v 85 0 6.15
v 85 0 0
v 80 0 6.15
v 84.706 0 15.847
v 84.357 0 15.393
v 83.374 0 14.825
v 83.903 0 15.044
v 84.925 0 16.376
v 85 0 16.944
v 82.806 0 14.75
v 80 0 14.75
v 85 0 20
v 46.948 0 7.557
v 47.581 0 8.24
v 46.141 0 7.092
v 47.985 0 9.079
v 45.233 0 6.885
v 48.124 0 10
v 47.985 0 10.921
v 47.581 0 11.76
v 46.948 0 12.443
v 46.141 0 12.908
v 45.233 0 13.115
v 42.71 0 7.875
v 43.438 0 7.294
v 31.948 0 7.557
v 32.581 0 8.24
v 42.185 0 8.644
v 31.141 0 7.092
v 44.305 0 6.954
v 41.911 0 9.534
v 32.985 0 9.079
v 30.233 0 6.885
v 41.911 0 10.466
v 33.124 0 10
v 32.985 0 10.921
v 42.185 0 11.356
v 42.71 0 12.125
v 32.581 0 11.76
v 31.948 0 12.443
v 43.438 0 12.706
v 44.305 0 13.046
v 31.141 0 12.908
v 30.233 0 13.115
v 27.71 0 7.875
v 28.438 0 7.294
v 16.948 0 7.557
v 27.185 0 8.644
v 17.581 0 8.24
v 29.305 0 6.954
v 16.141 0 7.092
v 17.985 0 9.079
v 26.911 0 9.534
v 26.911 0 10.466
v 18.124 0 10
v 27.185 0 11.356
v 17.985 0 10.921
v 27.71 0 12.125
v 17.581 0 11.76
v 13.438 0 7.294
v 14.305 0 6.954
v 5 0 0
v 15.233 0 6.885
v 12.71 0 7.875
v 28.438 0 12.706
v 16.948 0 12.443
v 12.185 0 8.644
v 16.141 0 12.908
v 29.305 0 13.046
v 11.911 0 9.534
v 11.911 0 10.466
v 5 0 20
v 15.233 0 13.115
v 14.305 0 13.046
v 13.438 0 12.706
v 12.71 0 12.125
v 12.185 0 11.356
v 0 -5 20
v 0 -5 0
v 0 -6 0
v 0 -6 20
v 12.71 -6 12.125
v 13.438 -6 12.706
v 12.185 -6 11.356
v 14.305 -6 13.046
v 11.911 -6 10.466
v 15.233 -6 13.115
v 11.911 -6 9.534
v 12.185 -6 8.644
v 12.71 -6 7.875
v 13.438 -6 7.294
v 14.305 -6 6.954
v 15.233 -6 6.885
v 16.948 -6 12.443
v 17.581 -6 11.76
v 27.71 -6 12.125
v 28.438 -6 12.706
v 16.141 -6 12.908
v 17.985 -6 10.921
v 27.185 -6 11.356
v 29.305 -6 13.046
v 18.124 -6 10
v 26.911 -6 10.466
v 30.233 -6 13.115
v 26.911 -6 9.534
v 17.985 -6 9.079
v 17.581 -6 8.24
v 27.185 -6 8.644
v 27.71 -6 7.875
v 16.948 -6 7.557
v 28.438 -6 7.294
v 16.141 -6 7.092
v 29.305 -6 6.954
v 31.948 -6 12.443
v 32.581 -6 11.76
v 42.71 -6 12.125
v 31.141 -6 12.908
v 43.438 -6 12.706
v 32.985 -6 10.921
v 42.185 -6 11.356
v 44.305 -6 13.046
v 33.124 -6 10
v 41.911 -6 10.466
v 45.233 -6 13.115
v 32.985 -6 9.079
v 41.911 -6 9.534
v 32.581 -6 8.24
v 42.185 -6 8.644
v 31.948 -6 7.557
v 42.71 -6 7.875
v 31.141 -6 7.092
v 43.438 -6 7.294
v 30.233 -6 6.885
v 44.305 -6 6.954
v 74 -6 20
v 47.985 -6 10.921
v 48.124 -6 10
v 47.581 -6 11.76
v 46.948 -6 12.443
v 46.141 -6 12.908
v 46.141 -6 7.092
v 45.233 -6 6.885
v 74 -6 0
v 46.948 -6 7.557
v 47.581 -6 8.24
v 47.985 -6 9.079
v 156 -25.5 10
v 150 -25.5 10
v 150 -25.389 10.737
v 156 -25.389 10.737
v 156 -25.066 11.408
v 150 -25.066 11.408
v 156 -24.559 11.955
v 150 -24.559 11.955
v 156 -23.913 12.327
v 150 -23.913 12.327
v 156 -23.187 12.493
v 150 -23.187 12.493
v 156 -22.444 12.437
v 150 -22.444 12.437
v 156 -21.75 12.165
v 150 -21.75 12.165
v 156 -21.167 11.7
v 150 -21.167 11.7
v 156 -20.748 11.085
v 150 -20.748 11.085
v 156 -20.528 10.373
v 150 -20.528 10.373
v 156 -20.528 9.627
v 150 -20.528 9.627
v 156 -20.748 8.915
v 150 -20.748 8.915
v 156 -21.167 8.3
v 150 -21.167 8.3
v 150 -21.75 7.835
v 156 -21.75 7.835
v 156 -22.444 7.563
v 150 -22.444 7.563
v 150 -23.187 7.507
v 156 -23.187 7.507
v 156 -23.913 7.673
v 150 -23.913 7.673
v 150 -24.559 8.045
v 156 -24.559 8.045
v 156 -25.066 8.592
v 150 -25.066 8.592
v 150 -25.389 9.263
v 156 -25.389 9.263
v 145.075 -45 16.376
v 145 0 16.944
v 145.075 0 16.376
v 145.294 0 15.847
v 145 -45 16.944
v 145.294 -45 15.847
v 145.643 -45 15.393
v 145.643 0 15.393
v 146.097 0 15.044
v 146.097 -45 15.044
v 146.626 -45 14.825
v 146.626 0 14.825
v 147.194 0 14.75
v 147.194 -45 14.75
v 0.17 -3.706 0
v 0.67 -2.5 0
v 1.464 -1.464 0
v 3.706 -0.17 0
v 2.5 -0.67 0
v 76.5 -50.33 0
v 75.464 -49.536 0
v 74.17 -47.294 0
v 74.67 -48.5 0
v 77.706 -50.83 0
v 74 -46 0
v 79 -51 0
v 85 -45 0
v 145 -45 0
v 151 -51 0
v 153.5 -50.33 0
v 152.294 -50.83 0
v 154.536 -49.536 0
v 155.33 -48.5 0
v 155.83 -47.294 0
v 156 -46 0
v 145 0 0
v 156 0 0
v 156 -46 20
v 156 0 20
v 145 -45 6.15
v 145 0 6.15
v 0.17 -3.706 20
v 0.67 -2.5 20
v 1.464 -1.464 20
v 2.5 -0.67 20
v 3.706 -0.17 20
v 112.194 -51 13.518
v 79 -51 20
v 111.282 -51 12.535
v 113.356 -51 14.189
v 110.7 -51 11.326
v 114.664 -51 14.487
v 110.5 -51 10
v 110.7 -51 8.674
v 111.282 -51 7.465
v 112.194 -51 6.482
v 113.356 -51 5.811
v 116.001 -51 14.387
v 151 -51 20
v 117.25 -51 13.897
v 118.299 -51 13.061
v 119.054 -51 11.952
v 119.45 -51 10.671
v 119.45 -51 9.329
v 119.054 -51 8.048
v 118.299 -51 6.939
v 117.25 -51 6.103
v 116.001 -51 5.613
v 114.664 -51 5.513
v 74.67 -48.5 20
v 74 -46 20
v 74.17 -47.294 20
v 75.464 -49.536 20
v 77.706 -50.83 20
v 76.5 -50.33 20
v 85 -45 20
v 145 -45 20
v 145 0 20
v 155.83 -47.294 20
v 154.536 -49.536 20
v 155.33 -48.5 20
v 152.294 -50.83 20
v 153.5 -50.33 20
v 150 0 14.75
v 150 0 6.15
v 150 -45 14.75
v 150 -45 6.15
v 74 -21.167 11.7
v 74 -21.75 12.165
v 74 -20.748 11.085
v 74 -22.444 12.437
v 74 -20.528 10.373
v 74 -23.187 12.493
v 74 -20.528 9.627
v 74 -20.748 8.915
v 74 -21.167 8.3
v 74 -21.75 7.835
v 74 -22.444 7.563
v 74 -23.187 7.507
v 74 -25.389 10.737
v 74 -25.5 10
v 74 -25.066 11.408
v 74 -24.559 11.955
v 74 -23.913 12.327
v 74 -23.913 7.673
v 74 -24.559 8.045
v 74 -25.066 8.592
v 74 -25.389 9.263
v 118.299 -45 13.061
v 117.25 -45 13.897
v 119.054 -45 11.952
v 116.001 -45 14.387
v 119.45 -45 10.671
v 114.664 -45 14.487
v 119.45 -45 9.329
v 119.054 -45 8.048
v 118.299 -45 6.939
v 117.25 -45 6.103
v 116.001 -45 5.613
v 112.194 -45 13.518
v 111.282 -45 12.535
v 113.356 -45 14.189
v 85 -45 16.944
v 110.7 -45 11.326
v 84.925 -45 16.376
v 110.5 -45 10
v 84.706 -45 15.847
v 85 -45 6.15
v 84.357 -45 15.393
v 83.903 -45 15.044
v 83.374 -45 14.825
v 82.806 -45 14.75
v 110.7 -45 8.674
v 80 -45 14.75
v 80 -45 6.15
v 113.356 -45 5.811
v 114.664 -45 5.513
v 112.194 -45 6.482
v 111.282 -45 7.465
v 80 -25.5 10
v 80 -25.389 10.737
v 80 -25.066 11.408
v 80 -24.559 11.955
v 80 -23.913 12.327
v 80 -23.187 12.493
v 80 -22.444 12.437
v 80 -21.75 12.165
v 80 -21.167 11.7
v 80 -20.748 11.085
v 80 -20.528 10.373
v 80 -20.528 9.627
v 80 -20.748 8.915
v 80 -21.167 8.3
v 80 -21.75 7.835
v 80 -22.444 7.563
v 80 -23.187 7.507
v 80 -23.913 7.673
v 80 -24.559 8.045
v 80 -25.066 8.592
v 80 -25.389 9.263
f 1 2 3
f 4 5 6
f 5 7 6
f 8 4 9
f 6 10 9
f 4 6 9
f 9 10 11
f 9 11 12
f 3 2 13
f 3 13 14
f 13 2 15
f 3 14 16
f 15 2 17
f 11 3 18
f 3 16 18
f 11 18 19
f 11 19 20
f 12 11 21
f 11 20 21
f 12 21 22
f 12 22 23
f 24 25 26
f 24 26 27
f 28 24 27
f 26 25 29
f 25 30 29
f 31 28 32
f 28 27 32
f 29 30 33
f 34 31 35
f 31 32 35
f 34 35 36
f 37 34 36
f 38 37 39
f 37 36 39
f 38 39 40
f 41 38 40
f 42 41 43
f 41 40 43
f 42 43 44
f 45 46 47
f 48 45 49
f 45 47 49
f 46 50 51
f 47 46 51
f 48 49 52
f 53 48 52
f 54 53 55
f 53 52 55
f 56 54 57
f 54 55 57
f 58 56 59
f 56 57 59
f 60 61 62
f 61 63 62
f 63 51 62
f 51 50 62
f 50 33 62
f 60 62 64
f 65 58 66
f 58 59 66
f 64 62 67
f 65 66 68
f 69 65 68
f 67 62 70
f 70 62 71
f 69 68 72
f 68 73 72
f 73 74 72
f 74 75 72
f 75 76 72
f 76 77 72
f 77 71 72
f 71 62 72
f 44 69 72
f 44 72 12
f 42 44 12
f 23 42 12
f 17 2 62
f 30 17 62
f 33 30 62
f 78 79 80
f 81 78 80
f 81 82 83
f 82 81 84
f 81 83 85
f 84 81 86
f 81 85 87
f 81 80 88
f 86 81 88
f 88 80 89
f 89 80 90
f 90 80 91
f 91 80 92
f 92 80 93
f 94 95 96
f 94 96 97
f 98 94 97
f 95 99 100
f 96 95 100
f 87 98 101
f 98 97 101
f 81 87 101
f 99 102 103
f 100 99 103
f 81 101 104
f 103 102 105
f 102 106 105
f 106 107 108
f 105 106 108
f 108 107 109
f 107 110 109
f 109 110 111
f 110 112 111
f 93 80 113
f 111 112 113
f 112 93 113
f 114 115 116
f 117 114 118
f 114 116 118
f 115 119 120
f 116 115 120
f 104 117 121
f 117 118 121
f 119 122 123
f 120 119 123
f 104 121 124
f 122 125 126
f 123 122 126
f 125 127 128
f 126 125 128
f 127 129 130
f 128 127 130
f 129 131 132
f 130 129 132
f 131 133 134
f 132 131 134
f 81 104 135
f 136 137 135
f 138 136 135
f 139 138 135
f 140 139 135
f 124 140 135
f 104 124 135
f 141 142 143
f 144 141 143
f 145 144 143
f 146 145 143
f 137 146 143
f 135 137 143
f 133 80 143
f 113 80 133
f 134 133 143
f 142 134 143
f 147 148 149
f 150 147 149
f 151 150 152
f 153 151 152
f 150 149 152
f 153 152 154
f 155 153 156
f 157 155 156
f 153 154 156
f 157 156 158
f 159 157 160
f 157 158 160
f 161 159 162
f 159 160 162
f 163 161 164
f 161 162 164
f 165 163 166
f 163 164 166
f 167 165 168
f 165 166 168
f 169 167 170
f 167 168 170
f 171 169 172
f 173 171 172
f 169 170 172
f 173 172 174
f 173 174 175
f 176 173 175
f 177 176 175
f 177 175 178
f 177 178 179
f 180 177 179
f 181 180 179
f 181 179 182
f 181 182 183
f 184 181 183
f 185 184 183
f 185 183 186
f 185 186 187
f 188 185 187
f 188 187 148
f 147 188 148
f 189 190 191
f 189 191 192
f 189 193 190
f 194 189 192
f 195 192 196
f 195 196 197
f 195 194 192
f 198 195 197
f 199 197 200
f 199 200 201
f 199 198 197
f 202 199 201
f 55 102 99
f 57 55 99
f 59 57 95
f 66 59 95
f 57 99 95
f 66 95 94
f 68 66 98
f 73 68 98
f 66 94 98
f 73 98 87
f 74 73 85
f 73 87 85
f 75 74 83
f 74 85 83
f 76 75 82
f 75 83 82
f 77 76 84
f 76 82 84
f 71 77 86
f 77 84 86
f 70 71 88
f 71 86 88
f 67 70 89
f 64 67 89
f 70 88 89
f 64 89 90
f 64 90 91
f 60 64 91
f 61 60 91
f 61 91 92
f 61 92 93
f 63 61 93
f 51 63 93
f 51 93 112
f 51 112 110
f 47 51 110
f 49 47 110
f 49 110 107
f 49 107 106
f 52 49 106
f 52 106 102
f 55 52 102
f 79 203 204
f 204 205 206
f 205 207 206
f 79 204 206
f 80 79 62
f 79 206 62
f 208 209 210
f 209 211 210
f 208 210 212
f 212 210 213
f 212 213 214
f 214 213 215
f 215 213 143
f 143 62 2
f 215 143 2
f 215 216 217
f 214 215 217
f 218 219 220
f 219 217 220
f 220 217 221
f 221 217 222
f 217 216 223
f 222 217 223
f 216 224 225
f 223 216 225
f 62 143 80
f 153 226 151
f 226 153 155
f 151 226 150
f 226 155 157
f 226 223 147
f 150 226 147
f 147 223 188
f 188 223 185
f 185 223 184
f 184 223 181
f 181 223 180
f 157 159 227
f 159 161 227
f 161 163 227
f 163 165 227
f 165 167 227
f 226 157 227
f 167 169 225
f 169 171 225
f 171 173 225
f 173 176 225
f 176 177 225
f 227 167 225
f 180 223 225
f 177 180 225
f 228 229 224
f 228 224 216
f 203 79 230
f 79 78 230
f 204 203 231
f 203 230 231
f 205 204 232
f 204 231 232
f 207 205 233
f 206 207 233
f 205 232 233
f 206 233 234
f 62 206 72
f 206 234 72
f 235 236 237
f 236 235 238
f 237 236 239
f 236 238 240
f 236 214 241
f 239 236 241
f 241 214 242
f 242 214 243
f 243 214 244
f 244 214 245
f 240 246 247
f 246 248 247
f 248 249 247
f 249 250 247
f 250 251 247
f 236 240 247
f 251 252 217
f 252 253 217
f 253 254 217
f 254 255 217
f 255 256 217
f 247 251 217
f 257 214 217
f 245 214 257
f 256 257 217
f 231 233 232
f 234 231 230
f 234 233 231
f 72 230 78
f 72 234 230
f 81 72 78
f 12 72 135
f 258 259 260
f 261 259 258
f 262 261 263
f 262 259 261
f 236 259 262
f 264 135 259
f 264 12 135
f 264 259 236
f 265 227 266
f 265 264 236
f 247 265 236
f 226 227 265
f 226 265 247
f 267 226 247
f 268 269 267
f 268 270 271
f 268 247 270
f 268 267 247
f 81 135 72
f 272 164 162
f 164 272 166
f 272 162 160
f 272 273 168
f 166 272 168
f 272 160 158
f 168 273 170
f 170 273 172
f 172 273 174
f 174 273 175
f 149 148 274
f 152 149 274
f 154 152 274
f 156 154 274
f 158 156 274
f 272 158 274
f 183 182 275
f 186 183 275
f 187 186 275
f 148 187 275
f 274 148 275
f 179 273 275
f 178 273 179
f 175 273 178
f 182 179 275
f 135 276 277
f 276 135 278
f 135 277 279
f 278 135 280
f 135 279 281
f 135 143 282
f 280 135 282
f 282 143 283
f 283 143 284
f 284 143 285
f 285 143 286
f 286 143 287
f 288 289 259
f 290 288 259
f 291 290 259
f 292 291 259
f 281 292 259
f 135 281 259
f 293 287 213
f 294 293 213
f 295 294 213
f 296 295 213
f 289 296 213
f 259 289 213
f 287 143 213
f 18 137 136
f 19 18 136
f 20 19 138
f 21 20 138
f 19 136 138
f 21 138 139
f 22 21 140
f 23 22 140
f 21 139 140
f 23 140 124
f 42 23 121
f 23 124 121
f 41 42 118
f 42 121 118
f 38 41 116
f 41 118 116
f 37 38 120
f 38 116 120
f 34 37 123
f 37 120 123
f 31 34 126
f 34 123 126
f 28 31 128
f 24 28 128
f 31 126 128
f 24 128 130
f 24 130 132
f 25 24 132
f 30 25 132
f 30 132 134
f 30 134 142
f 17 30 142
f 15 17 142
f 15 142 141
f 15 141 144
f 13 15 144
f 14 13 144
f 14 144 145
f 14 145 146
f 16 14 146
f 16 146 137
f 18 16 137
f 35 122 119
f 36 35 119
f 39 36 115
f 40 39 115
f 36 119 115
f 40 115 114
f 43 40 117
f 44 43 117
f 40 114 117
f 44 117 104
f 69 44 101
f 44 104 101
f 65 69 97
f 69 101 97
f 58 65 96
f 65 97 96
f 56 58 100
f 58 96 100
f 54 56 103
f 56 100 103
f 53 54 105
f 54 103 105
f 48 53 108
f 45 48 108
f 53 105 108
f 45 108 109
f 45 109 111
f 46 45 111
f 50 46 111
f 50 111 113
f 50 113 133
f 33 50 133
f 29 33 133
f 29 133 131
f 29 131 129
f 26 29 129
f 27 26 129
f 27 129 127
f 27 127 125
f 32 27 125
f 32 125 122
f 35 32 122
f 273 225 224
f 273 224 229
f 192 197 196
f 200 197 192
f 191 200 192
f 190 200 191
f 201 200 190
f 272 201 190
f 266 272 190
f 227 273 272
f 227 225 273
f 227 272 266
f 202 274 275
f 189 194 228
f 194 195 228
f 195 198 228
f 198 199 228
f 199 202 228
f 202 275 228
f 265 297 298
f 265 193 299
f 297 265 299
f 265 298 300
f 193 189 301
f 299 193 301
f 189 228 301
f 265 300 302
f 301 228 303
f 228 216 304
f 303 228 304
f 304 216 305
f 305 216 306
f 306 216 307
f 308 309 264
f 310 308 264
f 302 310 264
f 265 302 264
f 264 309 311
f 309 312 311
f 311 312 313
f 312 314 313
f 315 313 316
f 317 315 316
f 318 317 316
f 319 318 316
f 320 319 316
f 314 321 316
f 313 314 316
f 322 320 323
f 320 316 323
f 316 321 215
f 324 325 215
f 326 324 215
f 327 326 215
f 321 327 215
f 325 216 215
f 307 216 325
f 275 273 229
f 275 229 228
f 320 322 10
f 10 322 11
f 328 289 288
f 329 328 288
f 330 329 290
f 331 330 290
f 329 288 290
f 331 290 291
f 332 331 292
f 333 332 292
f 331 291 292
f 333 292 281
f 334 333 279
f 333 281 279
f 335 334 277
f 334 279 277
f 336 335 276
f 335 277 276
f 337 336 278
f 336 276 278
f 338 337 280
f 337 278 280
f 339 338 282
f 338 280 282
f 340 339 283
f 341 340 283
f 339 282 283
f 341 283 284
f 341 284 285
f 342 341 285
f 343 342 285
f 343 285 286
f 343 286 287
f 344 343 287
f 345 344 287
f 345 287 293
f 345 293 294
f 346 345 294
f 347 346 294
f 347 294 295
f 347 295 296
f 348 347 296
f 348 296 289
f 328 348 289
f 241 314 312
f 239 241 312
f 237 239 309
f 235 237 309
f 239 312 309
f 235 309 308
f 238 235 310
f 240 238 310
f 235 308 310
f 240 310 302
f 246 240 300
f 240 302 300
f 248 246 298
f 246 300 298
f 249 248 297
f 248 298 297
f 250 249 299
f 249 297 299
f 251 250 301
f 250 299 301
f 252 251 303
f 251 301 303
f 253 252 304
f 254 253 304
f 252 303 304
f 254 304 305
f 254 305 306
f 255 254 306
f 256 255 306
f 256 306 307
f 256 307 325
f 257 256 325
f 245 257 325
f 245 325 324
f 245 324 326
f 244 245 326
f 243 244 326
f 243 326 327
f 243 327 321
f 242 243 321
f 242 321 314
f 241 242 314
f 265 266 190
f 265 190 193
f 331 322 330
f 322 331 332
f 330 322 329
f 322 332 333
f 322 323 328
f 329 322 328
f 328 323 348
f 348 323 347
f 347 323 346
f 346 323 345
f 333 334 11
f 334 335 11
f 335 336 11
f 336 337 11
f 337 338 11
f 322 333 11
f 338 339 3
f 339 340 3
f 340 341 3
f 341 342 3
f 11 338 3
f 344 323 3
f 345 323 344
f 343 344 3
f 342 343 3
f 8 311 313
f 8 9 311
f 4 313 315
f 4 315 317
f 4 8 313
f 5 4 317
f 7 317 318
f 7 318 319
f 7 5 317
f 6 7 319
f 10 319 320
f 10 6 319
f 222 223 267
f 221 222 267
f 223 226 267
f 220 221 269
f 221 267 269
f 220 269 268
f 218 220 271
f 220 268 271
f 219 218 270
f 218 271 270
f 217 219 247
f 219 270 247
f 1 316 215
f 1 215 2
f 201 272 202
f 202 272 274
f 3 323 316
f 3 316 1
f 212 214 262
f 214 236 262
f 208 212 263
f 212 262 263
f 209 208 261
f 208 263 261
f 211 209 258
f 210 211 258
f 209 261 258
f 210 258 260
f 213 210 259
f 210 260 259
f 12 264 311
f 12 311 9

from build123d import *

# Parameters (mm, degrees)
F1_DEPTH = 20
F3_D     = 6.2484
F5_W     = 45
F5_H     = 5.25
F5_H_2   = 6.15
F6_DEPTH = 5
F4_W     = 45
F4_H     = 5.25
F4_H_2   = 6.15
F7_DEPTH = 5
F8_R     = 5
F9_R     = 2.193764509
F11_D    = 9
F13_D    = 5


with BuildPart() as f1:
    # F0 (on Top) → F1 (new body)
    with BuildSketch(Plane.XY):
        Polygon((80, 0), (0, 0), (0, -6), (74, -6), (74, -51), (156, -51), (156, 0), (150, 0), (150, -45), (80, -45), align=None)
    extrude(amount=F1_DEPTH)

    # F3 (through all)
    with Locations(Plane(origin=(0, 0, 0), x_dir=(-1, 0, 0), z_dir=(0, 1, 0))):
        with Locations((-45, 10), (-30, 10), (-15, 10)):
            Hole(F3_D / 2)

    # F5 (on face) → F6 (join)
    with BuildSketch(Plane(origin=(150, 0, 0), x_dir=(0, -1, 0), z_dir=(-1, 0, 0))):
        with Locations((22.5, 17.375)):
            Rectangle(F5_W, F5_H)
        with Locations((22.5, 3.075)):
            Rectangle(F5_W, F5_H_2)
    extrude(amount=F6_DEPTH)

    # F4 (on face) → F7 (join)
    with BuildSketch(Plane.YZ.offset(80)):
        with Locations((-22.5, 17.375)):
            Rectangle(F4_W, F4_H)
        with Locations((-22.5, 3.075)):
            Rectangle(F4_W, F4_H_2)
    extrude(amount=F7_DEPTH)

    # F8
    f8_edges = [f1.edges().sort_by_distance(p)[0] for p in [
        (74, -51, 10),
        (156, -51, 10),
        (0, 0, 10),
    ]]
    fillet(f8_edges, radius=F8_R)

    # F9
    f9_edges = [f1.edges().sort_by_distance(p)[0] for p in [
        (85, -22.5, 14.75),
        (145, -22.5, 14.75),
    ]]
    fillet(f9_edges, radius=F9_R)

    # F11 (through all)
    with Locations(Plane.XZ.offset(51)):
        with Locations((115, 10)):
            Hole(F11_D / 2)

    # F13 (through all)
    with Locations(Plane.YZ.offset(156)):
        with Locations((-23, 10)):
            Hole(F13_D / 2)


solid = f1.part
